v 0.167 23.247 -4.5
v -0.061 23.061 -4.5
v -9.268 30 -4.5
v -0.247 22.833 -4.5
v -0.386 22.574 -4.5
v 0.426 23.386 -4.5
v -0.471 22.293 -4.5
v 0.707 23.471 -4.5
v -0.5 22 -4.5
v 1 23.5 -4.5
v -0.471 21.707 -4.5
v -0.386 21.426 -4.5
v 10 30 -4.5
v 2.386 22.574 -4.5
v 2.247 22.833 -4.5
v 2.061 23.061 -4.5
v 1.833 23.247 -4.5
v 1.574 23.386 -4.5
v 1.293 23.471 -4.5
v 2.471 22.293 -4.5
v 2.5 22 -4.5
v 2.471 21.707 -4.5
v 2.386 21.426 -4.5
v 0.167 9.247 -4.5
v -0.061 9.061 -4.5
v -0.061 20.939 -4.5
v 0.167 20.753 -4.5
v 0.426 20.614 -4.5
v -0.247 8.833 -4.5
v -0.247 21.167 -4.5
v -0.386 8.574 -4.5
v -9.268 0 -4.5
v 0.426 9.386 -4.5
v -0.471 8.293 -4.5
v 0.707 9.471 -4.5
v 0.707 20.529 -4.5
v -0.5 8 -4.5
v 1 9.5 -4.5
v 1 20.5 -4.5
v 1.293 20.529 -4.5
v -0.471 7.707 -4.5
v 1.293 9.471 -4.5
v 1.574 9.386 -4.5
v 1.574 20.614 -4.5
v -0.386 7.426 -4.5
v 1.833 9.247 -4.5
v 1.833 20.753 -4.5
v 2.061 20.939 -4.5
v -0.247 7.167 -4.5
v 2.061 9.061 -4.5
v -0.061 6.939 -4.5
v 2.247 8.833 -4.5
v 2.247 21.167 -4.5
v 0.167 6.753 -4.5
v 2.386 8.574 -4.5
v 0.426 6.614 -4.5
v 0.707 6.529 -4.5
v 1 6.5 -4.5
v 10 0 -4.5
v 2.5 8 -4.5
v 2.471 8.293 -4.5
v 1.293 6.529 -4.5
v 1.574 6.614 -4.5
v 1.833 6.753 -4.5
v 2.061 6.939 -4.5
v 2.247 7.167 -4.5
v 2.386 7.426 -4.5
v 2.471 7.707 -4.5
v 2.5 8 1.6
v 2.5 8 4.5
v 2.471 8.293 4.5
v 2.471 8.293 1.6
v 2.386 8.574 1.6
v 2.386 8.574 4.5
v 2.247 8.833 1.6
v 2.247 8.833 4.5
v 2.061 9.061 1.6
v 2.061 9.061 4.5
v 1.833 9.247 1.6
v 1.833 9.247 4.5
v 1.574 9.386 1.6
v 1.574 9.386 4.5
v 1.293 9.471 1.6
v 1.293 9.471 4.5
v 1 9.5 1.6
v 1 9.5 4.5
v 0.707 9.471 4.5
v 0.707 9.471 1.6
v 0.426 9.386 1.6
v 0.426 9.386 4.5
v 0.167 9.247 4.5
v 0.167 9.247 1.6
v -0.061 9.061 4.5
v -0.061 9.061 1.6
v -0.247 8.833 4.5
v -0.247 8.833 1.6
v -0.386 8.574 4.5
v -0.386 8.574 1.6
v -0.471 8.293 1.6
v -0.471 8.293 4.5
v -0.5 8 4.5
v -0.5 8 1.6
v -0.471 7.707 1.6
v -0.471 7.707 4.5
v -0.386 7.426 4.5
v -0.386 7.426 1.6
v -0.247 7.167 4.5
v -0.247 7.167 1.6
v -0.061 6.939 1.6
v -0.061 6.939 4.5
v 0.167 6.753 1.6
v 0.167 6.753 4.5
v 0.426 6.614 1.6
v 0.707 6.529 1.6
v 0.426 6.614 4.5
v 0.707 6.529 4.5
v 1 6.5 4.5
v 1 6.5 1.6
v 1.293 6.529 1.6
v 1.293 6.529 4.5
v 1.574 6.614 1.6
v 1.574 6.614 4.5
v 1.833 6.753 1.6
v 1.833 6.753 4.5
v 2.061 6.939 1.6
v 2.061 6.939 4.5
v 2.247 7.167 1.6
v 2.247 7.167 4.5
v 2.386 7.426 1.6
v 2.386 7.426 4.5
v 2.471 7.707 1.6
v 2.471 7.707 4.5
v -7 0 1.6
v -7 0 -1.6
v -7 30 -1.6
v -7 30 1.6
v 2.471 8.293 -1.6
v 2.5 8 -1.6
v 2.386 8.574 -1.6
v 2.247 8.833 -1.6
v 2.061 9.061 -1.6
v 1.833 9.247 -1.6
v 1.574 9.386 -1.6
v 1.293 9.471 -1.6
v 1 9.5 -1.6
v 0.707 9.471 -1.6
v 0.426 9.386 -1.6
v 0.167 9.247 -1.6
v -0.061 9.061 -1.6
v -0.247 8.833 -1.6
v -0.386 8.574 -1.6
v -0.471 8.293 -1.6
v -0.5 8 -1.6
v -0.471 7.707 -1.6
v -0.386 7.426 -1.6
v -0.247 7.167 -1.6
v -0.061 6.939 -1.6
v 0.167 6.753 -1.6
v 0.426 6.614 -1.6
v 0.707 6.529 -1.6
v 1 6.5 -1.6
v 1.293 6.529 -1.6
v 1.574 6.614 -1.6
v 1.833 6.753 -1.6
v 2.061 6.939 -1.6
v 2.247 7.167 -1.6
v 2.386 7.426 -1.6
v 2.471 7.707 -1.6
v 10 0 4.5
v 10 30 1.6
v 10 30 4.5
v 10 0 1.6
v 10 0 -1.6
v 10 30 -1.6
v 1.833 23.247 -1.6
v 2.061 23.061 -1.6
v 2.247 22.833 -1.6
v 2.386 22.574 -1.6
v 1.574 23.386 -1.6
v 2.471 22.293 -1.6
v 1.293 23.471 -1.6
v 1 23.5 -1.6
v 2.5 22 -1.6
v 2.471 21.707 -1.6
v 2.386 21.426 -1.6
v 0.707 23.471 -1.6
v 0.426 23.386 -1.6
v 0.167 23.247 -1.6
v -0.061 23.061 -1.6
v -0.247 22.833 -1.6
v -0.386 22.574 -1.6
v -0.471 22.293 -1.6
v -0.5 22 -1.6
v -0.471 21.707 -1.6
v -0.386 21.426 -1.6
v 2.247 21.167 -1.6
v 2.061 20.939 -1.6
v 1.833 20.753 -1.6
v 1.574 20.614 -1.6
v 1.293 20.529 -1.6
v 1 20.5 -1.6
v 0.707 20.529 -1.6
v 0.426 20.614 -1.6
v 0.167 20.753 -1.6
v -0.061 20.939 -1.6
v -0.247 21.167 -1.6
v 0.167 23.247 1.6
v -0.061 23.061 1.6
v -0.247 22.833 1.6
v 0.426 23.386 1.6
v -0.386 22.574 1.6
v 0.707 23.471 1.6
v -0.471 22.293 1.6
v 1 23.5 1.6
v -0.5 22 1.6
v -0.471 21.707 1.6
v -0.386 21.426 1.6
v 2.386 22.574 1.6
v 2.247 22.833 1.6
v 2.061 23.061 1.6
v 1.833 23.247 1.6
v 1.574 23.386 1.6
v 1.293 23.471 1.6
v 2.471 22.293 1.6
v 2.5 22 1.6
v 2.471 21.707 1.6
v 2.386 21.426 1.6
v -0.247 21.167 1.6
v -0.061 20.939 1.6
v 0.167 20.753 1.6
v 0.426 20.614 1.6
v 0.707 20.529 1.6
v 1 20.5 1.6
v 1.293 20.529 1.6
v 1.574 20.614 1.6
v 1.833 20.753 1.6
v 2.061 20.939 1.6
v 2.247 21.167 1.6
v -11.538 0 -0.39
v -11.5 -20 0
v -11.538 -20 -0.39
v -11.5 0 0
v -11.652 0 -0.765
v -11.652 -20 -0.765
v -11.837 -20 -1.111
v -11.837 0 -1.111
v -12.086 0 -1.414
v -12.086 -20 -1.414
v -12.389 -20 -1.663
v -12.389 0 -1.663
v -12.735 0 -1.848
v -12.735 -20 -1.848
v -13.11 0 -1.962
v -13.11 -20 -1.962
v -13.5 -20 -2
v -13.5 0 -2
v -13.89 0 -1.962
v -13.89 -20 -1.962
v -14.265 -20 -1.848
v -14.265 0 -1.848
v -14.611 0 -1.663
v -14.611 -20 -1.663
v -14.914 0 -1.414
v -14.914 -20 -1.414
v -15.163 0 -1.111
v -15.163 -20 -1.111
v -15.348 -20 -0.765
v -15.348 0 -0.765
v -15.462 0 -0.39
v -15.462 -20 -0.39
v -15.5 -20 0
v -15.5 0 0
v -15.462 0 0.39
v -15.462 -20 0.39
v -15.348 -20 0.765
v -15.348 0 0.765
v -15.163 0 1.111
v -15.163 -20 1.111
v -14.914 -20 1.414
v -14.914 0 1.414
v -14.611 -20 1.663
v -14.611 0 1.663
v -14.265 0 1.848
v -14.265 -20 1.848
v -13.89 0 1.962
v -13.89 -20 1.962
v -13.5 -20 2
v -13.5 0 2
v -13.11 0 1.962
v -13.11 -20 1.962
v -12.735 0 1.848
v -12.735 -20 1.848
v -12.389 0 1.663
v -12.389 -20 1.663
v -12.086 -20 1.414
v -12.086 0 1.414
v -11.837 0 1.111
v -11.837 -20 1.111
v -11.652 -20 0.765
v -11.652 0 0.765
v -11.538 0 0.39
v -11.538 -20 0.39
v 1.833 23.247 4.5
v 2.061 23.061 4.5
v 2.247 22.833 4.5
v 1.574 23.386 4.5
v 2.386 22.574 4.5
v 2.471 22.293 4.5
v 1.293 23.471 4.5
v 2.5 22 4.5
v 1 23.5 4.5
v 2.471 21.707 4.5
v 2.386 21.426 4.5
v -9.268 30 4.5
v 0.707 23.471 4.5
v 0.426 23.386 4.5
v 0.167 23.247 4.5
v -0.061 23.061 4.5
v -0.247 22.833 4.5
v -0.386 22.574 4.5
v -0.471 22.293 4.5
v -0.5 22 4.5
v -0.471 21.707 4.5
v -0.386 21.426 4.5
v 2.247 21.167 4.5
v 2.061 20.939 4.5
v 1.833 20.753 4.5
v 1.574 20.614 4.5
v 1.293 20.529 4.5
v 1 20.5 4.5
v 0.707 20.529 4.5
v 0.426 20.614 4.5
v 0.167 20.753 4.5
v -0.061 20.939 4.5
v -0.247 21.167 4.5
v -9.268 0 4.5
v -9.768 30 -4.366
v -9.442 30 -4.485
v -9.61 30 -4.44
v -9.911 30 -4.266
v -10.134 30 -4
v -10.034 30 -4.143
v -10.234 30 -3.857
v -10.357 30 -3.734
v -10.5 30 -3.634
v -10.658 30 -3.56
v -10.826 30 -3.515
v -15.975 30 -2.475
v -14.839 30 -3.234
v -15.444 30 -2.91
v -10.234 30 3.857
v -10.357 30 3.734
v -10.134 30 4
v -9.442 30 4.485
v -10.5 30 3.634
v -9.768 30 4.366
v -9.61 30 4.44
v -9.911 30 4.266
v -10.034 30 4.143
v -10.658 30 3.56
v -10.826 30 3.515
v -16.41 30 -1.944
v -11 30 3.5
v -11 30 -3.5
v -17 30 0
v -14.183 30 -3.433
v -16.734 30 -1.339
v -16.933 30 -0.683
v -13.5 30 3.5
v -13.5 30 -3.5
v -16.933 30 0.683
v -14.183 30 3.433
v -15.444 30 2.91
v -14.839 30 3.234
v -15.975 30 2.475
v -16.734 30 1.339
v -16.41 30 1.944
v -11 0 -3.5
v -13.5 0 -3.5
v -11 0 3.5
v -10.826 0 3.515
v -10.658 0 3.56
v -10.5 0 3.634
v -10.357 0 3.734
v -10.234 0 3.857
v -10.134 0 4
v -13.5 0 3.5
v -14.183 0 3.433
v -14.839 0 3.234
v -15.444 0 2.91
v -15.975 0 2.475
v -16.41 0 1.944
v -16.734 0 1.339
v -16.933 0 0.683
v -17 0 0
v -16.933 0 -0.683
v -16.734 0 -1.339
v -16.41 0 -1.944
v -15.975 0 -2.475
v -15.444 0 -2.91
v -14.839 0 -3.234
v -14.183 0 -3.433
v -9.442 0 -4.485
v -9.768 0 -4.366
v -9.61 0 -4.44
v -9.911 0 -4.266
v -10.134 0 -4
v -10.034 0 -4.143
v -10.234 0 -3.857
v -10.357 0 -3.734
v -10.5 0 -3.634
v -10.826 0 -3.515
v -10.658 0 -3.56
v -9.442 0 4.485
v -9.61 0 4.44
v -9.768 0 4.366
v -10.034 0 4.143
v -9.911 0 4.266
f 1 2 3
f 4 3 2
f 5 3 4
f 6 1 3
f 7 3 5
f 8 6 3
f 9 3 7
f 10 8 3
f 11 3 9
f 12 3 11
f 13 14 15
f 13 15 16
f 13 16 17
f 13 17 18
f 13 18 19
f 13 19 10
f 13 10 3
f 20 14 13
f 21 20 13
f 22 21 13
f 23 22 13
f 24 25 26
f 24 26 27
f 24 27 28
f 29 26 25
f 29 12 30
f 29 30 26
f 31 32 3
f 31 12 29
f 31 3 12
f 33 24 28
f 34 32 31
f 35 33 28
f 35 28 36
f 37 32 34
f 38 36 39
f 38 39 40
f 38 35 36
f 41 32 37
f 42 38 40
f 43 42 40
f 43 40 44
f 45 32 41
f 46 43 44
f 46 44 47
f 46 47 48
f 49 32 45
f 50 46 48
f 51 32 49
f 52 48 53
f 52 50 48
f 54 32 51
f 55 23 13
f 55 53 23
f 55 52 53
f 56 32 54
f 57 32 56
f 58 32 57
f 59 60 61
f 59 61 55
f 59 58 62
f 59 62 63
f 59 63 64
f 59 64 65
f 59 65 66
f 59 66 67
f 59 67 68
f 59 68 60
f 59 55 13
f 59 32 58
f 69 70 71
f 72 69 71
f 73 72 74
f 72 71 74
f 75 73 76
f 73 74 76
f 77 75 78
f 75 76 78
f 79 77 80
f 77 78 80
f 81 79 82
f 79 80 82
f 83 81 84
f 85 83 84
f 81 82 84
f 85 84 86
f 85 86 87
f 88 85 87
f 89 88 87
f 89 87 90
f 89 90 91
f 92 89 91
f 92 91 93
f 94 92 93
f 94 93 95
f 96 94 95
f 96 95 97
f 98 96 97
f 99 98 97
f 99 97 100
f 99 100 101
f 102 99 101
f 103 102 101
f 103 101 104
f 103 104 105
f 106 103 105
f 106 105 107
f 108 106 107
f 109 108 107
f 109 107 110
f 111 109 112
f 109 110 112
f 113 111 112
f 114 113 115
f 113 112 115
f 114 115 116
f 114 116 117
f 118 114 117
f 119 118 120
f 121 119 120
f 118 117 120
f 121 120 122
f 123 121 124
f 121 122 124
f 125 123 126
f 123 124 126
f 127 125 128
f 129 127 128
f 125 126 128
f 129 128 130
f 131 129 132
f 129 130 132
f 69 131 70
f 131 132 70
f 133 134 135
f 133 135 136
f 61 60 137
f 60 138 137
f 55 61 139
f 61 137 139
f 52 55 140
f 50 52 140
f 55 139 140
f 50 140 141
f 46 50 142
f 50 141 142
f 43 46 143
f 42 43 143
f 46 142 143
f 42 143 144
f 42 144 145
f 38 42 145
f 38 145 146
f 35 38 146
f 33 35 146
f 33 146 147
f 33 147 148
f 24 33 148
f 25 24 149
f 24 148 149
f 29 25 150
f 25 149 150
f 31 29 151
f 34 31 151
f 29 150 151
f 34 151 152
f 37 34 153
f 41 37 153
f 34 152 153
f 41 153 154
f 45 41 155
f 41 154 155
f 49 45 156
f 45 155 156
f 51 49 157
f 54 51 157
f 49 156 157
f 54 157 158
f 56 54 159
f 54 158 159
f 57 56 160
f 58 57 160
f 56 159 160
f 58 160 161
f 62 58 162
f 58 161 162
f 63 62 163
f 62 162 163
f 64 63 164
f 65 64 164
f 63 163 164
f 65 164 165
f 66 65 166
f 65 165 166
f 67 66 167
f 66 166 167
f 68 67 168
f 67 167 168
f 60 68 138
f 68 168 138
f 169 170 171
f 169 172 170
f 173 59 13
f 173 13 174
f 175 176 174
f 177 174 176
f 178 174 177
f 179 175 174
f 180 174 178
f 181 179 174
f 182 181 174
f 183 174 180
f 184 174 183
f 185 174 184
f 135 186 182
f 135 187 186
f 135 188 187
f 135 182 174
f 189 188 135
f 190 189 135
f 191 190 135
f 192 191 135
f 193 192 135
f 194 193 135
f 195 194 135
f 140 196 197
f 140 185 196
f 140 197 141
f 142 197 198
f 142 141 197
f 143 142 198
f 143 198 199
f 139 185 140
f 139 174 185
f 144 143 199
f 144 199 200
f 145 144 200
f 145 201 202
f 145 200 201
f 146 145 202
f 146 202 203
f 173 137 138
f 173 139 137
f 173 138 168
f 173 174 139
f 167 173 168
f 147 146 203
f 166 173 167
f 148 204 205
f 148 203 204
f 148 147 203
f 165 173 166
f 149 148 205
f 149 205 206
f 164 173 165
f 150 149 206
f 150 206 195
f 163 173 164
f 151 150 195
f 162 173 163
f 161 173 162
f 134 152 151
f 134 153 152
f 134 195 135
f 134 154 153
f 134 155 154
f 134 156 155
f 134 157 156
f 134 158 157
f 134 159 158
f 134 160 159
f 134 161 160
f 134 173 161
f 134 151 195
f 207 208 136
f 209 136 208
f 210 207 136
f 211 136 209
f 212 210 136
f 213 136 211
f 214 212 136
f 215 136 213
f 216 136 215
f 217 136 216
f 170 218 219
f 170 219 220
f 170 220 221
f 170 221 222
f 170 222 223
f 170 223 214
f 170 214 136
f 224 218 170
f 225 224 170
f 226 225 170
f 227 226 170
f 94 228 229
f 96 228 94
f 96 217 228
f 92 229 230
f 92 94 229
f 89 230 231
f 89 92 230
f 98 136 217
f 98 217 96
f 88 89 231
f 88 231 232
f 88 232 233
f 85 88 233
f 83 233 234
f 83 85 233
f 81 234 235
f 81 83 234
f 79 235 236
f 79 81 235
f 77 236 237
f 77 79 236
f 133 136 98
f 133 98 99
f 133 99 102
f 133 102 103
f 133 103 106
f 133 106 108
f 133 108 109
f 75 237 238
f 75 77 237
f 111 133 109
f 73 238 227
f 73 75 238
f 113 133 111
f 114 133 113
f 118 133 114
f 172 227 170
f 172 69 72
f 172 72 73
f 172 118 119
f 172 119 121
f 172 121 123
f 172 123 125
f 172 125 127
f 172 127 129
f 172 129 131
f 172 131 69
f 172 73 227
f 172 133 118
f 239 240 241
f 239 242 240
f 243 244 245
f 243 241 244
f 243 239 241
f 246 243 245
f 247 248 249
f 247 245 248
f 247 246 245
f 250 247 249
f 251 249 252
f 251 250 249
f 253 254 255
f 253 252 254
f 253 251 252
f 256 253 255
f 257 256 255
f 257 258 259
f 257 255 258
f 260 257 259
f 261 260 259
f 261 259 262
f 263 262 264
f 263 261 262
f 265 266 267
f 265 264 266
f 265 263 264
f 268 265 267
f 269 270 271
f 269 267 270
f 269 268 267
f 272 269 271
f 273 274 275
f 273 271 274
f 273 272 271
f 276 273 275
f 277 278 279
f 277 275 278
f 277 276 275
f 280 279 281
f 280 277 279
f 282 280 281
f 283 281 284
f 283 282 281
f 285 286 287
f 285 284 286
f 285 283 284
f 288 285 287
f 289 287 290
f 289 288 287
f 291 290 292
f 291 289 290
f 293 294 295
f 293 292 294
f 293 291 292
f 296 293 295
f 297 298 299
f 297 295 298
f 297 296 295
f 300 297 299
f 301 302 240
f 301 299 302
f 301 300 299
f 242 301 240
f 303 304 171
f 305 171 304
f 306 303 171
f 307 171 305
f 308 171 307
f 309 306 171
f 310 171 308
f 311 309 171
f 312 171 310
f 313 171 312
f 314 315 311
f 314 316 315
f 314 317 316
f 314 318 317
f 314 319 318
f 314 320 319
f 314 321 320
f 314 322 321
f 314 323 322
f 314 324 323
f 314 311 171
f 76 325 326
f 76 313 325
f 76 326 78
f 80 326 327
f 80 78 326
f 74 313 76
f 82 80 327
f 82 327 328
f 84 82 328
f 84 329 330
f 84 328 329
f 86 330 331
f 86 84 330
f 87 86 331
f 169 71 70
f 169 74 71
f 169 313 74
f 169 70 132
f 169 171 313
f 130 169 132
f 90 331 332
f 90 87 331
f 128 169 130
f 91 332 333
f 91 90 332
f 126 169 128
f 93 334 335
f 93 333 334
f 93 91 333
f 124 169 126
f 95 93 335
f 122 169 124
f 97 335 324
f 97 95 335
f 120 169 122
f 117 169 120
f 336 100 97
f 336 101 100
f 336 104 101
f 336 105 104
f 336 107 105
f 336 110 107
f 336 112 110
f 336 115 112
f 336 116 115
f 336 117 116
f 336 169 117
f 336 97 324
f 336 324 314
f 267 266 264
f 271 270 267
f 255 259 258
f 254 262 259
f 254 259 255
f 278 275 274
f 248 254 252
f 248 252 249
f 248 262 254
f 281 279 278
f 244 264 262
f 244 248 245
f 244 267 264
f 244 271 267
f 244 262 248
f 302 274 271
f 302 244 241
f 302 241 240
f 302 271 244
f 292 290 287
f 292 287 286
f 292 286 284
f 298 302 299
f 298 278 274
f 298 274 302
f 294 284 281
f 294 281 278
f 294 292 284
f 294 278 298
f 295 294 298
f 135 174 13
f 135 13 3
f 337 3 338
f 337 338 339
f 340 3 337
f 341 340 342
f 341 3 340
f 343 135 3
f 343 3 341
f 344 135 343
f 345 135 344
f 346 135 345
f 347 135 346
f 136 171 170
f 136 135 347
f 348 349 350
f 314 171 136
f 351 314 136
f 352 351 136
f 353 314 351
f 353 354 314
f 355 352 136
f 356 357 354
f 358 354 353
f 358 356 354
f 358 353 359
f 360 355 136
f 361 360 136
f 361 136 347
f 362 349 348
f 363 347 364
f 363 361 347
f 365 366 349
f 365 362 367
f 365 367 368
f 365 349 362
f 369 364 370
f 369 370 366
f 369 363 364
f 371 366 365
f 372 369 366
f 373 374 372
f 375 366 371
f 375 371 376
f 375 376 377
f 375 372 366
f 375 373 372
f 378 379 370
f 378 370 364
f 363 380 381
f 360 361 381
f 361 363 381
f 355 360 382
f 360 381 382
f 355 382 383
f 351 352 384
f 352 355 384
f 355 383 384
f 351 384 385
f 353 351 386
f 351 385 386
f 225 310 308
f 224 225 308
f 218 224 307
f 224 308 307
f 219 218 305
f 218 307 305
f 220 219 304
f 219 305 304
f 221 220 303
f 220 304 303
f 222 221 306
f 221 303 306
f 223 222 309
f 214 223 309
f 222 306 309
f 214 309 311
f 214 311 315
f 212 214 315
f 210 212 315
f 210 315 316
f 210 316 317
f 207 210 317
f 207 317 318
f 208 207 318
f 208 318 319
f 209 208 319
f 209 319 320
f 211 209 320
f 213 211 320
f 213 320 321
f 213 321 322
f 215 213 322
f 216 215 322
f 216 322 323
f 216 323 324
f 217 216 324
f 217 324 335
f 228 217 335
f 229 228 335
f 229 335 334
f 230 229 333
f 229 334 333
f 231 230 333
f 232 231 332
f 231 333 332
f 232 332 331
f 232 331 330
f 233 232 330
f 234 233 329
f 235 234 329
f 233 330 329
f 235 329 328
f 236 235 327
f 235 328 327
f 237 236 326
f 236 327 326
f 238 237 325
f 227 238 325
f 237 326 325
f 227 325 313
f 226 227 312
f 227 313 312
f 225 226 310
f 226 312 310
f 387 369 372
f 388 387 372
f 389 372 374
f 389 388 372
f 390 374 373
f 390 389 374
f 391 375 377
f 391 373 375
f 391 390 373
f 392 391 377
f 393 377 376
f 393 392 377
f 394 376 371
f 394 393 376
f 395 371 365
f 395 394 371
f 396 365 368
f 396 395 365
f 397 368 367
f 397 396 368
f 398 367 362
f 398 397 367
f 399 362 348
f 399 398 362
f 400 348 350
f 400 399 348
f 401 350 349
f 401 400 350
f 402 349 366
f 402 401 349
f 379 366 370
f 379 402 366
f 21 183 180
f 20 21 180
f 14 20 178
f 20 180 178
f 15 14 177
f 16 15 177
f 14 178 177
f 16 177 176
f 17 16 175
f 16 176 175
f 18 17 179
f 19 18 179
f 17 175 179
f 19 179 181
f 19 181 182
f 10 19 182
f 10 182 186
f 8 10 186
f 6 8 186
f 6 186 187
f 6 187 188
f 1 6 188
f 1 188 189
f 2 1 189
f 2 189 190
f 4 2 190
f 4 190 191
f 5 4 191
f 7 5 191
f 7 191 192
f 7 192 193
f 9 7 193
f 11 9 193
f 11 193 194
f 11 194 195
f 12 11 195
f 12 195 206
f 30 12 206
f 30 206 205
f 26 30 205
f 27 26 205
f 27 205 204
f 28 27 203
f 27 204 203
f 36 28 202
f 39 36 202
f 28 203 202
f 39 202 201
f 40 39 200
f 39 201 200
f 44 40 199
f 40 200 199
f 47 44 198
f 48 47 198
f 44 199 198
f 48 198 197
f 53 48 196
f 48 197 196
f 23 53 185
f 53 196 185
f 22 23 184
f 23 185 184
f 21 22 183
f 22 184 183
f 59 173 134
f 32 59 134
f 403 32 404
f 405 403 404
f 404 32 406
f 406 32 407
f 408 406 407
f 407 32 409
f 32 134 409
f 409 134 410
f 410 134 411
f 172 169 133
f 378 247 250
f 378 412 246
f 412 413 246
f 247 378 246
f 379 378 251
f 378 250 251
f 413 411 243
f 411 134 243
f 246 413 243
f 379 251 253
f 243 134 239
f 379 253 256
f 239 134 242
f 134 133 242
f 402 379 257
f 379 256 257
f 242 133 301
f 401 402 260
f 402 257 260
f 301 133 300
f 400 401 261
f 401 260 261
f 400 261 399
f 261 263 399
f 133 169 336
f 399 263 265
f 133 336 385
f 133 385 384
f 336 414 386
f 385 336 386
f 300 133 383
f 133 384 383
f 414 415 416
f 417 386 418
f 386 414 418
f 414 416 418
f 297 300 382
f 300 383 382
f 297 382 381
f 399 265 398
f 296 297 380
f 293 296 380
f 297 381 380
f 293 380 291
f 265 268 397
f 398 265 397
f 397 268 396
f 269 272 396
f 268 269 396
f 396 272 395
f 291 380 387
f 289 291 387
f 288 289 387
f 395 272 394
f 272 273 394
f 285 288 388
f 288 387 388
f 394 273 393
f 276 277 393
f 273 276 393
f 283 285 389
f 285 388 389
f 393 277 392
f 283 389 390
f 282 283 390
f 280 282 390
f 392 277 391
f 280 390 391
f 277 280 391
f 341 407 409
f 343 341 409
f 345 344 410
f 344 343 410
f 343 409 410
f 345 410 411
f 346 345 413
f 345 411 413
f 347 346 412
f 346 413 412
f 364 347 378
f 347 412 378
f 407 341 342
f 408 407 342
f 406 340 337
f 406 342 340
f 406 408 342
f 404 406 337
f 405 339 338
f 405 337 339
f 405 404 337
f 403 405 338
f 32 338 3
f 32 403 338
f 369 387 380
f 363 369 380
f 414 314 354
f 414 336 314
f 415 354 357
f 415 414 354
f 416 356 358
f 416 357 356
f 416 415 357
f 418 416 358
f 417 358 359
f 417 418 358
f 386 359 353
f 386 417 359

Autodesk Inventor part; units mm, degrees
ref_plane "YZ Plane" through (0, 0, 0) normal (1, 0, 0) x (0, 1, 0)
ref_plane "XZ Plane" through (0, 0, 0) normal (0, 1, 0) x (-1, 0, 0)
ref_plane "XY Plane" through (0, 0, 0) normal (0, 0, 1) x (1, 0, 0)
sketch "Sketch1" plane through (0, 0, 0) normal (0, 1, 0) x (-1, 0, 0)
  line L0 (9.2679, -4.5) -> (-10, -4.5)
  line L1 (-10, 4.5) -> (9.2679, 4.5)
  line L2 (10, -4.5) -> (-10, 4.5) construction
  line L3 (-10, -4.5) -> (10, 4.5) construction
  arc A0 (13.5, -3.5) -> (13.5, 3.5) centre (13.5, 0) ccw
  line L4 (13.5, -3.5) -> (11, -3.5)
  line L5 (13.5, 3.5) -> (11, 3.5)
  line L6 (-10, -1.6) -> (7, -1.6)
  line L7 (7, -1.6) -> (7, 1.6)
  line L8 (7, 1.6) -> (-10, 1.6)
  line L9 (-10, -4.5) -> (-10, -1.6)
  line L10 (-10, 1.6) -> (-10, 4.5)
  line L11 (10, 4.5) -> (10, 4.5)
  line L12 (10, -4.5) -> (10, -4.5)
  arc A1 (11, -3.5) -> (10.134, -4) centre (11, -4.5) ccw
  arc A2 (10.134, 4) -> (11, 3.5) centre (11, 4.5) ccw
  arc A3 (9.2679, -4.5) -> (10.134, -4) centre (9.2679, -3.5) ccw
  arc A4 (10.134, 4) -> (9.2679, 4.5) centre (9.2679, 3.5) ccw
  point P0 (0, 0)
  dimension "d24" = 20
  dimension "d25" = 9
  dimension "d26" = 7
  dimension "d27" = 2.9
  dimension "d28" = 2.9
  dimension "d30" = 1
extrude "Extrusion4" add sketch "Sketch1" along normal blind 30
sketch "Sketch4" plane through (0, 0, 0) normal (0, -1, 0) x (1, 0, 0)
  arc A0 (-13.5, 3.5) -> (-13.5, -3.5) centre (-13.5, 0) ccw projected
  circle A1 centre (-13.5, 0) radius 2
  point P0 (0, 0)
  dimension "d33" = 4
extrude "Extrusion5" add sketch "Sketch4" along normal blind 20
sketch "Sketch5" plane through (-9.2679, 0, 4.5) normal (0, 0, 1) x (1, 0, 0)
  circle A0 centre (10.2679, 22) radius 1.5
  circle A1 centre (10.2679, 8) radius 1.5
  line L0 (19.2679, 0) -> (19.2679, 30) projected
  line L1 (0, 30) -> (19.2679, 30) projected
  line L2 (0, 0) -> (19.2679, 0) projected
  point P0 (9.2679, 0)
  dimension "d36" = 3
  dimension "d37" = 3
  dimension "d38" = 9
  dimension "d39" = 9
  dimension "d40" = 8
  dimension "d41" = 8
extrude "Extrusion6" cut sketch "Sketch5" against normal blind 20
properties part number "joint male"
